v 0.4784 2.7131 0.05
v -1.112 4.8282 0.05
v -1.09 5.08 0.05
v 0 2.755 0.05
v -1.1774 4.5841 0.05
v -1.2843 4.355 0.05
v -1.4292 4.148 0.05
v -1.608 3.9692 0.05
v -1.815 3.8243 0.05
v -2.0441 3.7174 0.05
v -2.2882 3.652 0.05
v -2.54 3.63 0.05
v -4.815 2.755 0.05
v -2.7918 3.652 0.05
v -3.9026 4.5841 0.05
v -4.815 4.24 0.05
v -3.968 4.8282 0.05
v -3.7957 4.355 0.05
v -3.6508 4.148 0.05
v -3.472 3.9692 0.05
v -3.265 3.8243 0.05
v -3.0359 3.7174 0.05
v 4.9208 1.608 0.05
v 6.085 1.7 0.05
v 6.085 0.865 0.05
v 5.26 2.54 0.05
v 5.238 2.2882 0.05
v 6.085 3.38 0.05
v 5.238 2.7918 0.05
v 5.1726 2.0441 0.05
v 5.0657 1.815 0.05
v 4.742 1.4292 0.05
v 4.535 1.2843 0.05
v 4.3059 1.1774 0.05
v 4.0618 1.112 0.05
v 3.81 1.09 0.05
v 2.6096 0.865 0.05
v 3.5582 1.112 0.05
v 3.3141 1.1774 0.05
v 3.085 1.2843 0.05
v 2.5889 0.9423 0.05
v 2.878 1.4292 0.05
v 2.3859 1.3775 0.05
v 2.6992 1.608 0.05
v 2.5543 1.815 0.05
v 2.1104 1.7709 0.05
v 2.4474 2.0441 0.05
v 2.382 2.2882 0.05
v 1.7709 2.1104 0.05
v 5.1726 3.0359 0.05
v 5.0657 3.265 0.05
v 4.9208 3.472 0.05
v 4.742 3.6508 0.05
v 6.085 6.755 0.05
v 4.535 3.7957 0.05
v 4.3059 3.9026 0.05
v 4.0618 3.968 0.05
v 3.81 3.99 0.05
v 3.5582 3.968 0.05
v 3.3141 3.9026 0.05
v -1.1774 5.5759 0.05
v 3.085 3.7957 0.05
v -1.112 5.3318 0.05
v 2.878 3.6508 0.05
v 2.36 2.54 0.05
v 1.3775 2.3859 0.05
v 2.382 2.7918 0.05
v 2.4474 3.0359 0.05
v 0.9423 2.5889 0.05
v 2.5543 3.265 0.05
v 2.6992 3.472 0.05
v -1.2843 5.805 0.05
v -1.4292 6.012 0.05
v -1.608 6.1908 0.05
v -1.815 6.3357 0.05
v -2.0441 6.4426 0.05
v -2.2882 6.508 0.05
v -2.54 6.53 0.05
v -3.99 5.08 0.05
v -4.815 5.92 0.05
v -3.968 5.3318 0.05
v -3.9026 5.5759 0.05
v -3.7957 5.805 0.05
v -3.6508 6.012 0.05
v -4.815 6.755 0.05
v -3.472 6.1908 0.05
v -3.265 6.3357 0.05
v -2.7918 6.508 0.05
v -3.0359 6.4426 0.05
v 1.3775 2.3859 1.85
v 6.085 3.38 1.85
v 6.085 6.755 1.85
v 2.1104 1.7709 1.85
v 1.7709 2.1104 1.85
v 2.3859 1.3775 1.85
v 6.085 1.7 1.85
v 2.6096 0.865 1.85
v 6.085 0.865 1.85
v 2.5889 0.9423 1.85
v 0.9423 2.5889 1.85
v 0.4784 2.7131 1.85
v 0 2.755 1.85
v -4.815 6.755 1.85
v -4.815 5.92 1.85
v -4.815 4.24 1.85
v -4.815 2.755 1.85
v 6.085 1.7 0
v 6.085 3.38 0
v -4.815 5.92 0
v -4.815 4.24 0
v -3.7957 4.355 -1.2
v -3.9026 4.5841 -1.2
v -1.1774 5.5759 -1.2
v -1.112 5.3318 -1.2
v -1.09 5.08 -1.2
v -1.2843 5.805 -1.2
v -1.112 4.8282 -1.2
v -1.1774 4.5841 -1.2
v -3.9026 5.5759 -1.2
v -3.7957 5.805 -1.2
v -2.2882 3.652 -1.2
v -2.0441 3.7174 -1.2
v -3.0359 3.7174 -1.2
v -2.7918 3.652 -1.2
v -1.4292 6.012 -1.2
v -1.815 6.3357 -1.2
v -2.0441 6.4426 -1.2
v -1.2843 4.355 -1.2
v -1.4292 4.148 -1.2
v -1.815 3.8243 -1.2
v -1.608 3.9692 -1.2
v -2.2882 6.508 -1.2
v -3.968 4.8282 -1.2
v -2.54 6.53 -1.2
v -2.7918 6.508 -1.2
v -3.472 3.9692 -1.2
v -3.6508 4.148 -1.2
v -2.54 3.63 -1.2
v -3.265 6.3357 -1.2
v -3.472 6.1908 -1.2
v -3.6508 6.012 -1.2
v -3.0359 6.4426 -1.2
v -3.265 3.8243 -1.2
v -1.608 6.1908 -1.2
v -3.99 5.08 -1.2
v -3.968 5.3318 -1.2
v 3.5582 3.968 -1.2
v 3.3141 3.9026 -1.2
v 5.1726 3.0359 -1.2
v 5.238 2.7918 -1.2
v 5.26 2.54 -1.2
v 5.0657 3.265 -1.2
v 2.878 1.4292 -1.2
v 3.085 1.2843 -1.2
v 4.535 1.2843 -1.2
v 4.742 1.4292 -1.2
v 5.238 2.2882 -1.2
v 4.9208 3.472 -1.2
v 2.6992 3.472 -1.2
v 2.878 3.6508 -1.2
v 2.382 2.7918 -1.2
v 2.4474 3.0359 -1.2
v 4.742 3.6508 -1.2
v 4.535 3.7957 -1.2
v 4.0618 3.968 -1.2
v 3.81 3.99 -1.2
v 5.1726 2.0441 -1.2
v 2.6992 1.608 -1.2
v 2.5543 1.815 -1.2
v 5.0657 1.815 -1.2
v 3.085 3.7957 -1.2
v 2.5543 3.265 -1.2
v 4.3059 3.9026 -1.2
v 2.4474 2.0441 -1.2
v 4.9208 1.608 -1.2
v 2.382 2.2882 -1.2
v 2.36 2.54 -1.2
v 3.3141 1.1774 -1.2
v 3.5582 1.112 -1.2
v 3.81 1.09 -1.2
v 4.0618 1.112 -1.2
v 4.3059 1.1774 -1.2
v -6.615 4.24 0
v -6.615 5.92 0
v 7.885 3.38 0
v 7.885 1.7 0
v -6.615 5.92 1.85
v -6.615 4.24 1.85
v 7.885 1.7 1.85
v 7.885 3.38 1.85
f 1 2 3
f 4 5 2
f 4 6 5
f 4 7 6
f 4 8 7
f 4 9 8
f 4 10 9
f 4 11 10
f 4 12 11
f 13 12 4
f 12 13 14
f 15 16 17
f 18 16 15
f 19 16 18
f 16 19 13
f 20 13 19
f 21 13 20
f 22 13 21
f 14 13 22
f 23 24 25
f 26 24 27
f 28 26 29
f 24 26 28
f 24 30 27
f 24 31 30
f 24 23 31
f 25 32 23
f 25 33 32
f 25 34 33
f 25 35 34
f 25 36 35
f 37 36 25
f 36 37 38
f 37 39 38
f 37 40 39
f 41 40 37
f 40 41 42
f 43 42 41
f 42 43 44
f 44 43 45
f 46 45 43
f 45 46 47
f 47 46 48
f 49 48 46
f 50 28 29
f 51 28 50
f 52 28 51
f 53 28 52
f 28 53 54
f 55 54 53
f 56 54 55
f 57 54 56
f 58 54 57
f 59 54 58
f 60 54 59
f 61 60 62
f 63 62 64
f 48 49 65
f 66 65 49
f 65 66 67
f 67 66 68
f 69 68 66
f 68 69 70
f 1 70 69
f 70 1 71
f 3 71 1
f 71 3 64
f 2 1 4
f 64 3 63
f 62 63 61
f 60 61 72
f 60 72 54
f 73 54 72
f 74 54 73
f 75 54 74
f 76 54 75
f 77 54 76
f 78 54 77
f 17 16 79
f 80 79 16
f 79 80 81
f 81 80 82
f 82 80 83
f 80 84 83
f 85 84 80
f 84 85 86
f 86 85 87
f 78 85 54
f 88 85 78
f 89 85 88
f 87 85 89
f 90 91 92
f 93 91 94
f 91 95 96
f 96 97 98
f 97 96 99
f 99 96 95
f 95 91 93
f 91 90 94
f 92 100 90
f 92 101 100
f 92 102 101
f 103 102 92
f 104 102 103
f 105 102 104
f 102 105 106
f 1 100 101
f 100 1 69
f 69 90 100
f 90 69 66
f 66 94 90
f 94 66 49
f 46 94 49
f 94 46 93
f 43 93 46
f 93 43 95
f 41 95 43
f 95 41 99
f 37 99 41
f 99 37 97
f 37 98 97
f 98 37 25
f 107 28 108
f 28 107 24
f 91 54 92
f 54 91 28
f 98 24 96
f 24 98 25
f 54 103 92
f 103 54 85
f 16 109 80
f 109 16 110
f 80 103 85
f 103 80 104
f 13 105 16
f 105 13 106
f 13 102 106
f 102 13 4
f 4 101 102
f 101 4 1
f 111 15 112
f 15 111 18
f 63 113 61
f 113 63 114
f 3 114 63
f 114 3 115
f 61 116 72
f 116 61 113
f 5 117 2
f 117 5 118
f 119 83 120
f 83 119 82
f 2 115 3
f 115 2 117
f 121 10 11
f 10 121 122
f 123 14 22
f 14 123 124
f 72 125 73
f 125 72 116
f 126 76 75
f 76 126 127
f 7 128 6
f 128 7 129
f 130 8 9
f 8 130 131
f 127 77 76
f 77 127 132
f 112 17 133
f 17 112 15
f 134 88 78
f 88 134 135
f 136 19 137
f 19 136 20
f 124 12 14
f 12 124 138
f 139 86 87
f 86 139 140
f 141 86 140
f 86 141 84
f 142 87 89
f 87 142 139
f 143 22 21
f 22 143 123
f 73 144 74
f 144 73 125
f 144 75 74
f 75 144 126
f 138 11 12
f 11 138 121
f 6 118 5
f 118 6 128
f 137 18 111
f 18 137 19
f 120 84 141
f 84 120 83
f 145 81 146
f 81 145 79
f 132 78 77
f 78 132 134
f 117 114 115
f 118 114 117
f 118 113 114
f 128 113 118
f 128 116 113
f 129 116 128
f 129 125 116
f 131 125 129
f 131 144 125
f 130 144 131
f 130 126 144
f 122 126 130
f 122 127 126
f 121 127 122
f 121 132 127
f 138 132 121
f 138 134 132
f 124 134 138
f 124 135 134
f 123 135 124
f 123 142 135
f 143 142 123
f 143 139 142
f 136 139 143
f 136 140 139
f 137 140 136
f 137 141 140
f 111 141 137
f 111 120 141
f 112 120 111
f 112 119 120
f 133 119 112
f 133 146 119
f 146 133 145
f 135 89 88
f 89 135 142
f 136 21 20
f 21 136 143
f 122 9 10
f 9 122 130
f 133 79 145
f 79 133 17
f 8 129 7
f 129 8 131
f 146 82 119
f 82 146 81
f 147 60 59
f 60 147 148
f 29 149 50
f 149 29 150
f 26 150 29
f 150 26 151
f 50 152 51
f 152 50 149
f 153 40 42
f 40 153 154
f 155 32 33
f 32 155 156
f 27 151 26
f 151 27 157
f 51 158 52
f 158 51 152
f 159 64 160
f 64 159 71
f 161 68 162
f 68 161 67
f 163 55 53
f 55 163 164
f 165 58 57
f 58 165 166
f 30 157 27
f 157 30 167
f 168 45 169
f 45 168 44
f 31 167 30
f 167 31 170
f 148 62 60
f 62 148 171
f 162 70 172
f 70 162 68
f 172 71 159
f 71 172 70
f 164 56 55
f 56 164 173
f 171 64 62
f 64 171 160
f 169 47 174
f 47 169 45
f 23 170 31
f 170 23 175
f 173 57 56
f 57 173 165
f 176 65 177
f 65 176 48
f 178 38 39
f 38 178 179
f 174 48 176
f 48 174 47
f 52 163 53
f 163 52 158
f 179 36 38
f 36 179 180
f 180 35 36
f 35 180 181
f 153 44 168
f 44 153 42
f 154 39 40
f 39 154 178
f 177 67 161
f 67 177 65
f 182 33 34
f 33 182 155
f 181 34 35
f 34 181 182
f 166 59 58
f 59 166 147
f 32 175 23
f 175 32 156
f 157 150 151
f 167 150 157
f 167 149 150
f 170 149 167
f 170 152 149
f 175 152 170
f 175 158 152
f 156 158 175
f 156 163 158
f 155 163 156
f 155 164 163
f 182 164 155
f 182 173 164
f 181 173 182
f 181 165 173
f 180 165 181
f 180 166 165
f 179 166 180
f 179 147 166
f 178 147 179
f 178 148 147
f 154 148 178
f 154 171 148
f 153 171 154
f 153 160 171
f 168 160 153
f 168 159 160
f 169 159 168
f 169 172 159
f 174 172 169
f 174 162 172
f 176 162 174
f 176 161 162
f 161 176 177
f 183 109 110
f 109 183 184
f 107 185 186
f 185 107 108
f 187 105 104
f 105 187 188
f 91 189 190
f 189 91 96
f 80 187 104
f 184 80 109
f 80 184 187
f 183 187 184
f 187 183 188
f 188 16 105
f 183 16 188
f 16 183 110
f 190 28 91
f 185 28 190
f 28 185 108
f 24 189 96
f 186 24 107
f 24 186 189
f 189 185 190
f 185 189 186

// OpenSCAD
// Hot swap socket
//
// This designed so that the center pin of MX compatible keyboard switches is centered.
// Also, this is a simplified model and details are omitted.

cx = (1.27*3 - 1.27*2)/2;
cy = 1.27*3;

color("beige") translate([0,0,0.05]) {
    linear_extrude(1.80) {
        difference() {
            translate([cx,cy]) {
                square(size=[10.90,5.89], center=true);
            }
            
            gap = 5.89 - 4;
            translate([cx-10.90/2,cy-(5.89/2)]) {
                square(size=[10.90/2-cx,gap]);
            }

            // Calculate from the center pin of the key switch
            circle(r=cy-(5.89/2)+gap, $fn=36);
        }
    }

    translate([-1.27*2,1.27*4,-(3.05-1.80)]) {
        // d±0.05
        cylinder(d=2.9, h=3.05-1.80, $fn=36);
    }
    
    translate([1.27*3,1.27*2,-(3.05-1.80)]) {
        // d±0.05
        cylinder(d=2.9, h=3.05-1.80, $fn=36);
    }
}

color("silver") linear_extrude(1.85) {
    //pad_min_margin = 11.30;
    pad_min_margin = 10.90;
    pad_len = (14.50 - pad_min_margin)/2;
    
    translate([cx-pad_min_margin/2-pad_len/2,1.27*4]) {
        square([pad_len,1.68], center=true);
    }
    
    translate([cx+pad_min_margin/2+pad_len/2,1.27*2]) {
        square([pad_len,1.68], center=true);
    }
}
